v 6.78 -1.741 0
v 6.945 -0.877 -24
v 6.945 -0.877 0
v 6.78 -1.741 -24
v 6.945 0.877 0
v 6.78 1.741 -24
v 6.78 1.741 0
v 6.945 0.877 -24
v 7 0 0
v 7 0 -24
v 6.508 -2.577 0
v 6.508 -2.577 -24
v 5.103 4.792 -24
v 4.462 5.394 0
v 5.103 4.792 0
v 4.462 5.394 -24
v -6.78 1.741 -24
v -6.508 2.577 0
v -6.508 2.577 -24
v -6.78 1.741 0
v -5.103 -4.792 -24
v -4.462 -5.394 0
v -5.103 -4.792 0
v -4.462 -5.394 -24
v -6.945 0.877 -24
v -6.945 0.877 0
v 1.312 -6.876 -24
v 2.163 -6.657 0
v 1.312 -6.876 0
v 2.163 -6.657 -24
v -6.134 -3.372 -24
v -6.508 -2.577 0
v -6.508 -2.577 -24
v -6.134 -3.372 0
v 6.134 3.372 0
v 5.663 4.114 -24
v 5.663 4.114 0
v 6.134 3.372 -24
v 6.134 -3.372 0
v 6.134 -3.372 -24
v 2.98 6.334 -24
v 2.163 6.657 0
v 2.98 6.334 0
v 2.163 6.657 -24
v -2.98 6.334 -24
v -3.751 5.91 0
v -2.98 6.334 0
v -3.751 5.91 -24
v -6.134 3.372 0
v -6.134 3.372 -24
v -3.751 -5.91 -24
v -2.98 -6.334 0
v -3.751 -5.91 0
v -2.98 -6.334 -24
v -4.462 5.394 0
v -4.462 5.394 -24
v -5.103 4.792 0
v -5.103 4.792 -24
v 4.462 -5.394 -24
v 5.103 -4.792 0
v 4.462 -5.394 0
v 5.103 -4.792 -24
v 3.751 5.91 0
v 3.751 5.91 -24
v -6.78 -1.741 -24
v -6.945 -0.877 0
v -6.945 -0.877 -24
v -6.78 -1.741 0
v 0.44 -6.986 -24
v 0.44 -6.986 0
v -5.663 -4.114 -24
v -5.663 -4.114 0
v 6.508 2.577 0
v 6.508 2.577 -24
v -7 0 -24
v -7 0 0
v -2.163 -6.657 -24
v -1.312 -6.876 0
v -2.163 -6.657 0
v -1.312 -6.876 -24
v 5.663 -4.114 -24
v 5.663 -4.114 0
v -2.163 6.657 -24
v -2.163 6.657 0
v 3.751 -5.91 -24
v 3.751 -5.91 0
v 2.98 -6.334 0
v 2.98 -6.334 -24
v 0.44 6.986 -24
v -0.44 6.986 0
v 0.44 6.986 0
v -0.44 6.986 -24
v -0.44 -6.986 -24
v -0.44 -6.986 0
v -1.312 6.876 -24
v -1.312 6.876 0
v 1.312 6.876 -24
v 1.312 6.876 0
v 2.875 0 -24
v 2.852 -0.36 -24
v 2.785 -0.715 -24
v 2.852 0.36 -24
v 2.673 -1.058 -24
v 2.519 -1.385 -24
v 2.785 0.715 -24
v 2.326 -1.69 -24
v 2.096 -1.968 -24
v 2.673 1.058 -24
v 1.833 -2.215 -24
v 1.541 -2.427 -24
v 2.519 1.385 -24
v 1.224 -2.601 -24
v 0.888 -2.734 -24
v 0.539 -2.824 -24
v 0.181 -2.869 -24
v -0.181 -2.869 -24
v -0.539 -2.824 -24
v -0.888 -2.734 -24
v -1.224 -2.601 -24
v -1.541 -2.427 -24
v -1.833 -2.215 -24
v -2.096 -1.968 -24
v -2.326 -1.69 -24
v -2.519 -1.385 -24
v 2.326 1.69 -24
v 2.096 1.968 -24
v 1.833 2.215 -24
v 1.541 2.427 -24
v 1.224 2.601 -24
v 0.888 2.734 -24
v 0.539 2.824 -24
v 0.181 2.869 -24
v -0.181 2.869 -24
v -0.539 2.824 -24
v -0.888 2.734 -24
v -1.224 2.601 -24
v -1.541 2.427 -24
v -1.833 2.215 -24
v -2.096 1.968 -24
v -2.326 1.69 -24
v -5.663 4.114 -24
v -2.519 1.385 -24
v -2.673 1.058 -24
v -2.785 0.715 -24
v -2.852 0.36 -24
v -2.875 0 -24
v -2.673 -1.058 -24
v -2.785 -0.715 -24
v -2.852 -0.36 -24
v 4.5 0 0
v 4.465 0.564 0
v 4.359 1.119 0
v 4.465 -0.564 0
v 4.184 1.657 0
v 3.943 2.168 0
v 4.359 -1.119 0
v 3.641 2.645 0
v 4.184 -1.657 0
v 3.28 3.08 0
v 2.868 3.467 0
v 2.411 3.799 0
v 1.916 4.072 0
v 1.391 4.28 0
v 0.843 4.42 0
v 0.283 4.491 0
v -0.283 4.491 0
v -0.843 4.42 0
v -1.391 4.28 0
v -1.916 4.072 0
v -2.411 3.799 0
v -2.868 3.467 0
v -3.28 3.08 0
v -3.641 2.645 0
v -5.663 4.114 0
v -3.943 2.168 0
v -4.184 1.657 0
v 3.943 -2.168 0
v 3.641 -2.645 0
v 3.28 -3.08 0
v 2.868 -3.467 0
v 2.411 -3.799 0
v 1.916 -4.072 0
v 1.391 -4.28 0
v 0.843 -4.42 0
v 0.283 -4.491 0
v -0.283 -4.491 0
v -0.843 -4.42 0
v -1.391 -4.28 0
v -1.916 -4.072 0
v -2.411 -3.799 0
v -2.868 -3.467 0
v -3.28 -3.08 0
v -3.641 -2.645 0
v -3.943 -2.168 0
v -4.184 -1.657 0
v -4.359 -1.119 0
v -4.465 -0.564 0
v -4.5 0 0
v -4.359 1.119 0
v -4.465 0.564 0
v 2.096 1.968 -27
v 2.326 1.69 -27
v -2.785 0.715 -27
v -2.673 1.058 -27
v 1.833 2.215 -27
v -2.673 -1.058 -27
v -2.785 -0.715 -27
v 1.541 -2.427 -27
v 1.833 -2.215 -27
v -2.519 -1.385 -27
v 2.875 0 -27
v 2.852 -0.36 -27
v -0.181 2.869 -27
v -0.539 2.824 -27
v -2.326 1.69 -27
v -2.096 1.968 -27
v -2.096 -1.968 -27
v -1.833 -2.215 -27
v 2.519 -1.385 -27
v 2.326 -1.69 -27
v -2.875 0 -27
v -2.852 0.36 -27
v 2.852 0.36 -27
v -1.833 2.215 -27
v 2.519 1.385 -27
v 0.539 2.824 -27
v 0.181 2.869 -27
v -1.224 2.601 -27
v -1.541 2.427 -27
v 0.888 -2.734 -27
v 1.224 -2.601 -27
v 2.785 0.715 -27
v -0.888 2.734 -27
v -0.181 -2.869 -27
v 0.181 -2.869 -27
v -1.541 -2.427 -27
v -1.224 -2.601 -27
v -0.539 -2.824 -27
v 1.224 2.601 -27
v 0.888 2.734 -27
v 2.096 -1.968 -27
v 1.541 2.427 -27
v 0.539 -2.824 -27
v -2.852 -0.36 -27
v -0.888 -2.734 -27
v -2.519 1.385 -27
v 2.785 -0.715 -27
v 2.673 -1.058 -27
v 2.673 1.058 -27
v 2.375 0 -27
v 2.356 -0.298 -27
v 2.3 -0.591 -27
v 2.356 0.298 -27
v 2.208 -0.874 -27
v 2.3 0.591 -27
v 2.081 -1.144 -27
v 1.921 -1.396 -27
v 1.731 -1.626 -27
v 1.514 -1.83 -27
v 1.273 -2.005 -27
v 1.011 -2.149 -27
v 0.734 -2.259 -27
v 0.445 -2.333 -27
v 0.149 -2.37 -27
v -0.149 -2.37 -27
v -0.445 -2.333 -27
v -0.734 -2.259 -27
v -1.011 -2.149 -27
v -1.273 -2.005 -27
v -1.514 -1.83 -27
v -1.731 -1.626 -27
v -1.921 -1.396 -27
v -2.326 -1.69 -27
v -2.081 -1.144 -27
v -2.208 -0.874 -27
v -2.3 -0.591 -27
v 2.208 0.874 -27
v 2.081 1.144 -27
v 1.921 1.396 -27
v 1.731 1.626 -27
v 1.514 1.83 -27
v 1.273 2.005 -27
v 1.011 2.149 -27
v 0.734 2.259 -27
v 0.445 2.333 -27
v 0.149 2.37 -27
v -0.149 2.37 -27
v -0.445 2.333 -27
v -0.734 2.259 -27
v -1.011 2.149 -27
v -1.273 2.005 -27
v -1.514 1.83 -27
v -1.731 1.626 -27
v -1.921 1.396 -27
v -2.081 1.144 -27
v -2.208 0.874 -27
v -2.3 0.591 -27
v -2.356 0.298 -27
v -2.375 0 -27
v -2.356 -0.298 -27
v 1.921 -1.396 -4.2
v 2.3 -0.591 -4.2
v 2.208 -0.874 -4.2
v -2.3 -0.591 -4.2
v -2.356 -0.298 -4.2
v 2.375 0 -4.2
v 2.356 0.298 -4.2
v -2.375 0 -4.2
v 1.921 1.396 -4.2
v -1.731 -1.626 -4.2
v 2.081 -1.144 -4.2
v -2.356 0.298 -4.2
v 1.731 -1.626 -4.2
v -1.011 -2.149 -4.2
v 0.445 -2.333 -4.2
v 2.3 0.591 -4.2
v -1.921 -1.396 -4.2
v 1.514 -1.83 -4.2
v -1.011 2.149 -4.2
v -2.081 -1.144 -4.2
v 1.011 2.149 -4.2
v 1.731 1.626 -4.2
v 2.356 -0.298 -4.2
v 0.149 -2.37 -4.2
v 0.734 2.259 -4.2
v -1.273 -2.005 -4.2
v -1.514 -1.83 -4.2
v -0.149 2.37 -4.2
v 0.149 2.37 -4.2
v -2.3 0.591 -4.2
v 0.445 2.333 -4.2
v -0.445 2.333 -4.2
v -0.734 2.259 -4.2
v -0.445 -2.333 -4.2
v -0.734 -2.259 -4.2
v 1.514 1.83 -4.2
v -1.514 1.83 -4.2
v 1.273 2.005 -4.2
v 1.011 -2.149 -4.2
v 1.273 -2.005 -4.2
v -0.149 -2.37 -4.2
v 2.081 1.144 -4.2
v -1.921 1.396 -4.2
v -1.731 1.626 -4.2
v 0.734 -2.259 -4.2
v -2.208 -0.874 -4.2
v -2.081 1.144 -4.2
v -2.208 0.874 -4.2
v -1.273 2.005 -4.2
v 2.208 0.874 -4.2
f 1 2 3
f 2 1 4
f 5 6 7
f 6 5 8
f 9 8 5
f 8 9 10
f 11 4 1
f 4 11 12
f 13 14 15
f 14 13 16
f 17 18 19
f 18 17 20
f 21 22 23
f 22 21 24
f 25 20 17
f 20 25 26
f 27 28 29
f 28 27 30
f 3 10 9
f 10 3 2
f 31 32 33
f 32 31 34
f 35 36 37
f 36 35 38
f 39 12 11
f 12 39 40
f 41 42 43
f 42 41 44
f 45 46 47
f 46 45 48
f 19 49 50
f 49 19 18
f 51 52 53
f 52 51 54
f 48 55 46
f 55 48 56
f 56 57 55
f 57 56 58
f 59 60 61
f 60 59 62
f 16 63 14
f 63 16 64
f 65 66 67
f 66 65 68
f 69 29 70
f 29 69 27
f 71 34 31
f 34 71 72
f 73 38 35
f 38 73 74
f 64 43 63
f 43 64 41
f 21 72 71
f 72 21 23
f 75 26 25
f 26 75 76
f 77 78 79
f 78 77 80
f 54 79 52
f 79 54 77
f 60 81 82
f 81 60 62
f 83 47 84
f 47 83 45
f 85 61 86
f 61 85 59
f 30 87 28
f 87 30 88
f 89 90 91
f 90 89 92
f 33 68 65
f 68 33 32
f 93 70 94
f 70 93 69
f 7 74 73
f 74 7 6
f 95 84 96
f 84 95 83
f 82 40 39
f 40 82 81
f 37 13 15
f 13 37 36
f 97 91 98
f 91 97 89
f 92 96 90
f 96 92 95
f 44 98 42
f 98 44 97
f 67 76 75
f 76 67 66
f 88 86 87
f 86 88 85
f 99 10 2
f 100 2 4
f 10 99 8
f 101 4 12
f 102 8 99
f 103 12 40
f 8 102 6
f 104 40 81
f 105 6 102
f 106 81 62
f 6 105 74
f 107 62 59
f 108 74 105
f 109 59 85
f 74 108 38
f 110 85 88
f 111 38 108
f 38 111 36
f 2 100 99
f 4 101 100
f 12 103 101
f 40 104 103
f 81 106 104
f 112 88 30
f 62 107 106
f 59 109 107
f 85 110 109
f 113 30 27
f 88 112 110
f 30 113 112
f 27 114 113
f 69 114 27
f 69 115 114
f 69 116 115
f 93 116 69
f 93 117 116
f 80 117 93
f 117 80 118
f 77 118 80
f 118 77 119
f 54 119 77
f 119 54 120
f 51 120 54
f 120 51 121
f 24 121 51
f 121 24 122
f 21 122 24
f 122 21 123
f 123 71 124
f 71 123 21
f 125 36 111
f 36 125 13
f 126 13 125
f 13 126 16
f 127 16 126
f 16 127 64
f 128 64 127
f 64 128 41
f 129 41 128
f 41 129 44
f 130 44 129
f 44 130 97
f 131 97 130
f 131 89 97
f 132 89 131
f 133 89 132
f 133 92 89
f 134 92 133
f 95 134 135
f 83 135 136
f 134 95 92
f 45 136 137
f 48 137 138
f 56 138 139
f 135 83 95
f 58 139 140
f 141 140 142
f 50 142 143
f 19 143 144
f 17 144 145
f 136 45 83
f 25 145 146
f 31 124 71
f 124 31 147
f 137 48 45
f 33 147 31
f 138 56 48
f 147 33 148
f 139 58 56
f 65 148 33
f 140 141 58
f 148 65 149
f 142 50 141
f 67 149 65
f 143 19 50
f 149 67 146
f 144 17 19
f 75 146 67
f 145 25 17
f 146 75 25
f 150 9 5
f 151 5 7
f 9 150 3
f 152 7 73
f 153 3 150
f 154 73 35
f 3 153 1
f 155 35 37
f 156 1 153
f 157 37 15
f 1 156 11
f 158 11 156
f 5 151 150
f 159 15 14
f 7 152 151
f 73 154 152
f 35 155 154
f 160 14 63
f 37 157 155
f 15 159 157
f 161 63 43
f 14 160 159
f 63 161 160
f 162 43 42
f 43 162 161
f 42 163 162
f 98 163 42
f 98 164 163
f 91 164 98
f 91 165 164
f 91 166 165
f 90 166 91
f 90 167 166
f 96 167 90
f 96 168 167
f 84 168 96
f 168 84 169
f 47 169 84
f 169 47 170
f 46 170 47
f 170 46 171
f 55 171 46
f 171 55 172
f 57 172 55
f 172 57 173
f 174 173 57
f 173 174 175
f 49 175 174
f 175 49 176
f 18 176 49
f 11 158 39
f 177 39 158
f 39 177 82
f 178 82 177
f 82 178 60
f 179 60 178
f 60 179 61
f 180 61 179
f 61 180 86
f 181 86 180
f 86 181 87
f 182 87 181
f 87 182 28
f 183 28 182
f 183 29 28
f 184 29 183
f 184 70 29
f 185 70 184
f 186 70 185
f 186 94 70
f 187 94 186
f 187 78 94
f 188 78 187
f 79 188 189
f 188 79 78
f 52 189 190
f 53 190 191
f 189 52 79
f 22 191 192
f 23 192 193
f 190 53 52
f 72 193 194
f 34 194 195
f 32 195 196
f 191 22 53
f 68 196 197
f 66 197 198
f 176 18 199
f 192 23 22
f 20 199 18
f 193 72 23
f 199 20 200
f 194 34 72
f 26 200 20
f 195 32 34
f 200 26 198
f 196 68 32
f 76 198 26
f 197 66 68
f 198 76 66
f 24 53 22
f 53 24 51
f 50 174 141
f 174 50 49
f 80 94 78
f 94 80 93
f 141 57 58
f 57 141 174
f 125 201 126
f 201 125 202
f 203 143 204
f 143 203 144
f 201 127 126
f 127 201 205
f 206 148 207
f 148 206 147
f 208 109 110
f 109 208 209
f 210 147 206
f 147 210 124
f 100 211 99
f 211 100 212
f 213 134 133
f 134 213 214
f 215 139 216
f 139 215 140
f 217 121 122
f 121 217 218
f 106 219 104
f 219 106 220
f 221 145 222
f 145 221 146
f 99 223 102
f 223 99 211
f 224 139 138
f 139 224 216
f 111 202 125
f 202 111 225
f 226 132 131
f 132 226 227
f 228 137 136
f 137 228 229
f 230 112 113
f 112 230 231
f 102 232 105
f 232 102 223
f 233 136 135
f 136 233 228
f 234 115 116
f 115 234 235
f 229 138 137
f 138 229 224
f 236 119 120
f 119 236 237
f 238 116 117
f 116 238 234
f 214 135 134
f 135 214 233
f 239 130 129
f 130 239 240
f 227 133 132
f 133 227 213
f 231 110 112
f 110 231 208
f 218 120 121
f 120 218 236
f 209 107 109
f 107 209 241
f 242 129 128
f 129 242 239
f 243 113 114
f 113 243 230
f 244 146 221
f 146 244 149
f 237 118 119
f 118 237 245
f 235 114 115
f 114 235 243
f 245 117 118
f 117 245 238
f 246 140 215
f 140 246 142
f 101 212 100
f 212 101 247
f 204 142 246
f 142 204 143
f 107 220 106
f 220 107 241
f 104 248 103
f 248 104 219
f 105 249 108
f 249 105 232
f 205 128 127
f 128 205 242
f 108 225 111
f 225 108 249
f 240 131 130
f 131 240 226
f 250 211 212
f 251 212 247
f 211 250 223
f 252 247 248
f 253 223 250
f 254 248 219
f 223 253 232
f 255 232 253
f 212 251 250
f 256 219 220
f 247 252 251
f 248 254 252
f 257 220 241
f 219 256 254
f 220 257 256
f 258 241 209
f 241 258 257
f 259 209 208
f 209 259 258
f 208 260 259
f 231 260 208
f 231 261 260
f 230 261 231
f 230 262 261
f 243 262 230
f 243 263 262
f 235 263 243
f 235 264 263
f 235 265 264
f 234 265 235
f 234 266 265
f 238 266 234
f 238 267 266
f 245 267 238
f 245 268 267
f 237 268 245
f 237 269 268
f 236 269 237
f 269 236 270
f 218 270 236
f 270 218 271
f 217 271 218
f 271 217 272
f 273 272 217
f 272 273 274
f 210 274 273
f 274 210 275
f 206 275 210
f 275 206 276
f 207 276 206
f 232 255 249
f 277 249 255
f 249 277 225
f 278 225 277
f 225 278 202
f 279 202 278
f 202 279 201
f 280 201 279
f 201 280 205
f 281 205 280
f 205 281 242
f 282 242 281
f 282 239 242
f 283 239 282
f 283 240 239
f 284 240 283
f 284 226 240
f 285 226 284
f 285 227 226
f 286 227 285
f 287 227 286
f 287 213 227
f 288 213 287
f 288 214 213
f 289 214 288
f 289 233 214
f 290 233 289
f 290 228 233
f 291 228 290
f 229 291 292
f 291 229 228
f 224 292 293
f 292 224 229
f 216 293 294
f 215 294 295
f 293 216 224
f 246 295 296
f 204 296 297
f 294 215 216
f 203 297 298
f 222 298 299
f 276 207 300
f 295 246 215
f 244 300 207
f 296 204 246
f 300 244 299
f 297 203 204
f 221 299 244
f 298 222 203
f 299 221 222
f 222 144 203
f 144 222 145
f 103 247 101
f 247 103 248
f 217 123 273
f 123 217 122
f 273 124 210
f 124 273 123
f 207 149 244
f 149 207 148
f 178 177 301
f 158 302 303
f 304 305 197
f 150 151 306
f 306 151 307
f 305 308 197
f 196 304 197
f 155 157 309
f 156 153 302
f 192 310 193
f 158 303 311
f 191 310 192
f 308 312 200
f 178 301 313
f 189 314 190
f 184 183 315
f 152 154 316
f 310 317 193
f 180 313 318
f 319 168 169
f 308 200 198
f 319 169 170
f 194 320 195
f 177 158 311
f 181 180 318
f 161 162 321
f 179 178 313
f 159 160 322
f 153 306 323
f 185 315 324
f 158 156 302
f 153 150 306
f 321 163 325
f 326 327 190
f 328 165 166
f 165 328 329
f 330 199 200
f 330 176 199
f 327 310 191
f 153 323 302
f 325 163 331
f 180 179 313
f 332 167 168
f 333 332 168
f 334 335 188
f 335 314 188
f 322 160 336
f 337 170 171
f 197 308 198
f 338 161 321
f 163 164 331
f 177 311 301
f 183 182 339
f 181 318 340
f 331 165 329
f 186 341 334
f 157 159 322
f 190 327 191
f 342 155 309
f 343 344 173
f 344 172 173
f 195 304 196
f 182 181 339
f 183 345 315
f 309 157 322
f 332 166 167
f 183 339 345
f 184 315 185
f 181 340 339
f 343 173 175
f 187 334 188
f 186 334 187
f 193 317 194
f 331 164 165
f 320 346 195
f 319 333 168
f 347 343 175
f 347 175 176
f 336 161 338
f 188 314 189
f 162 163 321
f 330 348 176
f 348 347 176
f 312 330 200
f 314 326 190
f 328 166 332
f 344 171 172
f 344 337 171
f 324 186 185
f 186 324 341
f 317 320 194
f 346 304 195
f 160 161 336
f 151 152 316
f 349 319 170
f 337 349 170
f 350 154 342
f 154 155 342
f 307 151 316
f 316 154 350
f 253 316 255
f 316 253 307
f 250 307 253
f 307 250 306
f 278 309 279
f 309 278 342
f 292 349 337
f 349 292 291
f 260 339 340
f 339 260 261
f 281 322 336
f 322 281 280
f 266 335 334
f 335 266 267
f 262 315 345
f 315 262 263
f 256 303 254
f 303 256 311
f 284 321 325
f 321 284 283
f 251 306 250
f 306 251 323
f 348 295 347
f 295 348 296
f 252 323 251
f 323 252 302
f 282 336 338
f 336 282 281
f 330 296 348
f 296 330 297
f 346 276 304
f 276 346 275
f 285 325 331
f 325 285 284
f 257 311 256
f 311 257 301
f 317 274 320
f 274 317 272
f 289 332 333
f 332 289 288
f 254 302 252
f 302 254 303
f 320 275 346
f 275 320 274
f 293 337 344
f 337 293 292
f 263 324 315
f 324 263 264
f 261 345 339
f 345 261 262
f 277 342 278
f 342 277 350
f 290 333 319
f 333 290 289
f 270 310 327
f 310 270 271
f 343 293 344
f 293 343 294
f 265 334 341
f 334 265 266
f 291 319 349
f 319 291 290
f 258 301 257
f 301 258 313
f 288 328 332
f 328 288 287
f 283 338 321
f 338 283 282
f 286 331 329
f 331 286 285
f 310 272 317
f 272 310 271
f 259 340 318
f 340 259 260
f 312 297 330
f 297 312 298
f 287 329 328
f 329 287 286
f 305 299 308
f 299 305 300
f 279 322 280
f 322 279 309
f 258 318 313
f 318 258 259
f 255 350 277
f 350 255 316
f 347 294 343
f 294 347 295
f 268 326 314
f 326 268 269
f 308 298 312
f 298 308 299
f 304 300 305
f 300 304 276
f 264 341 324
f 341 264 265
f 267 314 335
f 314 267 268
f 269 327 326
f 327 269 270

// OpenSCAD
$fn = 50;

difference() {
	union() {
		translate(v = [0, 0, -24.0]) {
			cylinder(h = 24, r = 7.0);
		}
		#translate(v = [0, 0, -27.0]) {
			cylinder(h = 27, r = 2.875);
		}
	}
	union() {
		translate(v = [0, 0, 0]) {
			rotate(a = [0, 0, 0]) {
				difference() {
					union() {
						translate(v = [0, 0, -27.0]) {
							cylinder(h = 27, r = 2.25);
						}
						translate(v = [0, 0, -4.2]) {
							cylinder(h = 4.2, r1 = 2.375, r2 = 4.5);
						}
						translate(v = [0, 0, -27.0]) {
							cylinder(h = 27, r = 2.375);
						}
						translate(v = [0, 0, -27.0]) {
							cylinder(h = 27, r = 2.25);
						}
					}
					union();
				}
			}
		}
	}
}
